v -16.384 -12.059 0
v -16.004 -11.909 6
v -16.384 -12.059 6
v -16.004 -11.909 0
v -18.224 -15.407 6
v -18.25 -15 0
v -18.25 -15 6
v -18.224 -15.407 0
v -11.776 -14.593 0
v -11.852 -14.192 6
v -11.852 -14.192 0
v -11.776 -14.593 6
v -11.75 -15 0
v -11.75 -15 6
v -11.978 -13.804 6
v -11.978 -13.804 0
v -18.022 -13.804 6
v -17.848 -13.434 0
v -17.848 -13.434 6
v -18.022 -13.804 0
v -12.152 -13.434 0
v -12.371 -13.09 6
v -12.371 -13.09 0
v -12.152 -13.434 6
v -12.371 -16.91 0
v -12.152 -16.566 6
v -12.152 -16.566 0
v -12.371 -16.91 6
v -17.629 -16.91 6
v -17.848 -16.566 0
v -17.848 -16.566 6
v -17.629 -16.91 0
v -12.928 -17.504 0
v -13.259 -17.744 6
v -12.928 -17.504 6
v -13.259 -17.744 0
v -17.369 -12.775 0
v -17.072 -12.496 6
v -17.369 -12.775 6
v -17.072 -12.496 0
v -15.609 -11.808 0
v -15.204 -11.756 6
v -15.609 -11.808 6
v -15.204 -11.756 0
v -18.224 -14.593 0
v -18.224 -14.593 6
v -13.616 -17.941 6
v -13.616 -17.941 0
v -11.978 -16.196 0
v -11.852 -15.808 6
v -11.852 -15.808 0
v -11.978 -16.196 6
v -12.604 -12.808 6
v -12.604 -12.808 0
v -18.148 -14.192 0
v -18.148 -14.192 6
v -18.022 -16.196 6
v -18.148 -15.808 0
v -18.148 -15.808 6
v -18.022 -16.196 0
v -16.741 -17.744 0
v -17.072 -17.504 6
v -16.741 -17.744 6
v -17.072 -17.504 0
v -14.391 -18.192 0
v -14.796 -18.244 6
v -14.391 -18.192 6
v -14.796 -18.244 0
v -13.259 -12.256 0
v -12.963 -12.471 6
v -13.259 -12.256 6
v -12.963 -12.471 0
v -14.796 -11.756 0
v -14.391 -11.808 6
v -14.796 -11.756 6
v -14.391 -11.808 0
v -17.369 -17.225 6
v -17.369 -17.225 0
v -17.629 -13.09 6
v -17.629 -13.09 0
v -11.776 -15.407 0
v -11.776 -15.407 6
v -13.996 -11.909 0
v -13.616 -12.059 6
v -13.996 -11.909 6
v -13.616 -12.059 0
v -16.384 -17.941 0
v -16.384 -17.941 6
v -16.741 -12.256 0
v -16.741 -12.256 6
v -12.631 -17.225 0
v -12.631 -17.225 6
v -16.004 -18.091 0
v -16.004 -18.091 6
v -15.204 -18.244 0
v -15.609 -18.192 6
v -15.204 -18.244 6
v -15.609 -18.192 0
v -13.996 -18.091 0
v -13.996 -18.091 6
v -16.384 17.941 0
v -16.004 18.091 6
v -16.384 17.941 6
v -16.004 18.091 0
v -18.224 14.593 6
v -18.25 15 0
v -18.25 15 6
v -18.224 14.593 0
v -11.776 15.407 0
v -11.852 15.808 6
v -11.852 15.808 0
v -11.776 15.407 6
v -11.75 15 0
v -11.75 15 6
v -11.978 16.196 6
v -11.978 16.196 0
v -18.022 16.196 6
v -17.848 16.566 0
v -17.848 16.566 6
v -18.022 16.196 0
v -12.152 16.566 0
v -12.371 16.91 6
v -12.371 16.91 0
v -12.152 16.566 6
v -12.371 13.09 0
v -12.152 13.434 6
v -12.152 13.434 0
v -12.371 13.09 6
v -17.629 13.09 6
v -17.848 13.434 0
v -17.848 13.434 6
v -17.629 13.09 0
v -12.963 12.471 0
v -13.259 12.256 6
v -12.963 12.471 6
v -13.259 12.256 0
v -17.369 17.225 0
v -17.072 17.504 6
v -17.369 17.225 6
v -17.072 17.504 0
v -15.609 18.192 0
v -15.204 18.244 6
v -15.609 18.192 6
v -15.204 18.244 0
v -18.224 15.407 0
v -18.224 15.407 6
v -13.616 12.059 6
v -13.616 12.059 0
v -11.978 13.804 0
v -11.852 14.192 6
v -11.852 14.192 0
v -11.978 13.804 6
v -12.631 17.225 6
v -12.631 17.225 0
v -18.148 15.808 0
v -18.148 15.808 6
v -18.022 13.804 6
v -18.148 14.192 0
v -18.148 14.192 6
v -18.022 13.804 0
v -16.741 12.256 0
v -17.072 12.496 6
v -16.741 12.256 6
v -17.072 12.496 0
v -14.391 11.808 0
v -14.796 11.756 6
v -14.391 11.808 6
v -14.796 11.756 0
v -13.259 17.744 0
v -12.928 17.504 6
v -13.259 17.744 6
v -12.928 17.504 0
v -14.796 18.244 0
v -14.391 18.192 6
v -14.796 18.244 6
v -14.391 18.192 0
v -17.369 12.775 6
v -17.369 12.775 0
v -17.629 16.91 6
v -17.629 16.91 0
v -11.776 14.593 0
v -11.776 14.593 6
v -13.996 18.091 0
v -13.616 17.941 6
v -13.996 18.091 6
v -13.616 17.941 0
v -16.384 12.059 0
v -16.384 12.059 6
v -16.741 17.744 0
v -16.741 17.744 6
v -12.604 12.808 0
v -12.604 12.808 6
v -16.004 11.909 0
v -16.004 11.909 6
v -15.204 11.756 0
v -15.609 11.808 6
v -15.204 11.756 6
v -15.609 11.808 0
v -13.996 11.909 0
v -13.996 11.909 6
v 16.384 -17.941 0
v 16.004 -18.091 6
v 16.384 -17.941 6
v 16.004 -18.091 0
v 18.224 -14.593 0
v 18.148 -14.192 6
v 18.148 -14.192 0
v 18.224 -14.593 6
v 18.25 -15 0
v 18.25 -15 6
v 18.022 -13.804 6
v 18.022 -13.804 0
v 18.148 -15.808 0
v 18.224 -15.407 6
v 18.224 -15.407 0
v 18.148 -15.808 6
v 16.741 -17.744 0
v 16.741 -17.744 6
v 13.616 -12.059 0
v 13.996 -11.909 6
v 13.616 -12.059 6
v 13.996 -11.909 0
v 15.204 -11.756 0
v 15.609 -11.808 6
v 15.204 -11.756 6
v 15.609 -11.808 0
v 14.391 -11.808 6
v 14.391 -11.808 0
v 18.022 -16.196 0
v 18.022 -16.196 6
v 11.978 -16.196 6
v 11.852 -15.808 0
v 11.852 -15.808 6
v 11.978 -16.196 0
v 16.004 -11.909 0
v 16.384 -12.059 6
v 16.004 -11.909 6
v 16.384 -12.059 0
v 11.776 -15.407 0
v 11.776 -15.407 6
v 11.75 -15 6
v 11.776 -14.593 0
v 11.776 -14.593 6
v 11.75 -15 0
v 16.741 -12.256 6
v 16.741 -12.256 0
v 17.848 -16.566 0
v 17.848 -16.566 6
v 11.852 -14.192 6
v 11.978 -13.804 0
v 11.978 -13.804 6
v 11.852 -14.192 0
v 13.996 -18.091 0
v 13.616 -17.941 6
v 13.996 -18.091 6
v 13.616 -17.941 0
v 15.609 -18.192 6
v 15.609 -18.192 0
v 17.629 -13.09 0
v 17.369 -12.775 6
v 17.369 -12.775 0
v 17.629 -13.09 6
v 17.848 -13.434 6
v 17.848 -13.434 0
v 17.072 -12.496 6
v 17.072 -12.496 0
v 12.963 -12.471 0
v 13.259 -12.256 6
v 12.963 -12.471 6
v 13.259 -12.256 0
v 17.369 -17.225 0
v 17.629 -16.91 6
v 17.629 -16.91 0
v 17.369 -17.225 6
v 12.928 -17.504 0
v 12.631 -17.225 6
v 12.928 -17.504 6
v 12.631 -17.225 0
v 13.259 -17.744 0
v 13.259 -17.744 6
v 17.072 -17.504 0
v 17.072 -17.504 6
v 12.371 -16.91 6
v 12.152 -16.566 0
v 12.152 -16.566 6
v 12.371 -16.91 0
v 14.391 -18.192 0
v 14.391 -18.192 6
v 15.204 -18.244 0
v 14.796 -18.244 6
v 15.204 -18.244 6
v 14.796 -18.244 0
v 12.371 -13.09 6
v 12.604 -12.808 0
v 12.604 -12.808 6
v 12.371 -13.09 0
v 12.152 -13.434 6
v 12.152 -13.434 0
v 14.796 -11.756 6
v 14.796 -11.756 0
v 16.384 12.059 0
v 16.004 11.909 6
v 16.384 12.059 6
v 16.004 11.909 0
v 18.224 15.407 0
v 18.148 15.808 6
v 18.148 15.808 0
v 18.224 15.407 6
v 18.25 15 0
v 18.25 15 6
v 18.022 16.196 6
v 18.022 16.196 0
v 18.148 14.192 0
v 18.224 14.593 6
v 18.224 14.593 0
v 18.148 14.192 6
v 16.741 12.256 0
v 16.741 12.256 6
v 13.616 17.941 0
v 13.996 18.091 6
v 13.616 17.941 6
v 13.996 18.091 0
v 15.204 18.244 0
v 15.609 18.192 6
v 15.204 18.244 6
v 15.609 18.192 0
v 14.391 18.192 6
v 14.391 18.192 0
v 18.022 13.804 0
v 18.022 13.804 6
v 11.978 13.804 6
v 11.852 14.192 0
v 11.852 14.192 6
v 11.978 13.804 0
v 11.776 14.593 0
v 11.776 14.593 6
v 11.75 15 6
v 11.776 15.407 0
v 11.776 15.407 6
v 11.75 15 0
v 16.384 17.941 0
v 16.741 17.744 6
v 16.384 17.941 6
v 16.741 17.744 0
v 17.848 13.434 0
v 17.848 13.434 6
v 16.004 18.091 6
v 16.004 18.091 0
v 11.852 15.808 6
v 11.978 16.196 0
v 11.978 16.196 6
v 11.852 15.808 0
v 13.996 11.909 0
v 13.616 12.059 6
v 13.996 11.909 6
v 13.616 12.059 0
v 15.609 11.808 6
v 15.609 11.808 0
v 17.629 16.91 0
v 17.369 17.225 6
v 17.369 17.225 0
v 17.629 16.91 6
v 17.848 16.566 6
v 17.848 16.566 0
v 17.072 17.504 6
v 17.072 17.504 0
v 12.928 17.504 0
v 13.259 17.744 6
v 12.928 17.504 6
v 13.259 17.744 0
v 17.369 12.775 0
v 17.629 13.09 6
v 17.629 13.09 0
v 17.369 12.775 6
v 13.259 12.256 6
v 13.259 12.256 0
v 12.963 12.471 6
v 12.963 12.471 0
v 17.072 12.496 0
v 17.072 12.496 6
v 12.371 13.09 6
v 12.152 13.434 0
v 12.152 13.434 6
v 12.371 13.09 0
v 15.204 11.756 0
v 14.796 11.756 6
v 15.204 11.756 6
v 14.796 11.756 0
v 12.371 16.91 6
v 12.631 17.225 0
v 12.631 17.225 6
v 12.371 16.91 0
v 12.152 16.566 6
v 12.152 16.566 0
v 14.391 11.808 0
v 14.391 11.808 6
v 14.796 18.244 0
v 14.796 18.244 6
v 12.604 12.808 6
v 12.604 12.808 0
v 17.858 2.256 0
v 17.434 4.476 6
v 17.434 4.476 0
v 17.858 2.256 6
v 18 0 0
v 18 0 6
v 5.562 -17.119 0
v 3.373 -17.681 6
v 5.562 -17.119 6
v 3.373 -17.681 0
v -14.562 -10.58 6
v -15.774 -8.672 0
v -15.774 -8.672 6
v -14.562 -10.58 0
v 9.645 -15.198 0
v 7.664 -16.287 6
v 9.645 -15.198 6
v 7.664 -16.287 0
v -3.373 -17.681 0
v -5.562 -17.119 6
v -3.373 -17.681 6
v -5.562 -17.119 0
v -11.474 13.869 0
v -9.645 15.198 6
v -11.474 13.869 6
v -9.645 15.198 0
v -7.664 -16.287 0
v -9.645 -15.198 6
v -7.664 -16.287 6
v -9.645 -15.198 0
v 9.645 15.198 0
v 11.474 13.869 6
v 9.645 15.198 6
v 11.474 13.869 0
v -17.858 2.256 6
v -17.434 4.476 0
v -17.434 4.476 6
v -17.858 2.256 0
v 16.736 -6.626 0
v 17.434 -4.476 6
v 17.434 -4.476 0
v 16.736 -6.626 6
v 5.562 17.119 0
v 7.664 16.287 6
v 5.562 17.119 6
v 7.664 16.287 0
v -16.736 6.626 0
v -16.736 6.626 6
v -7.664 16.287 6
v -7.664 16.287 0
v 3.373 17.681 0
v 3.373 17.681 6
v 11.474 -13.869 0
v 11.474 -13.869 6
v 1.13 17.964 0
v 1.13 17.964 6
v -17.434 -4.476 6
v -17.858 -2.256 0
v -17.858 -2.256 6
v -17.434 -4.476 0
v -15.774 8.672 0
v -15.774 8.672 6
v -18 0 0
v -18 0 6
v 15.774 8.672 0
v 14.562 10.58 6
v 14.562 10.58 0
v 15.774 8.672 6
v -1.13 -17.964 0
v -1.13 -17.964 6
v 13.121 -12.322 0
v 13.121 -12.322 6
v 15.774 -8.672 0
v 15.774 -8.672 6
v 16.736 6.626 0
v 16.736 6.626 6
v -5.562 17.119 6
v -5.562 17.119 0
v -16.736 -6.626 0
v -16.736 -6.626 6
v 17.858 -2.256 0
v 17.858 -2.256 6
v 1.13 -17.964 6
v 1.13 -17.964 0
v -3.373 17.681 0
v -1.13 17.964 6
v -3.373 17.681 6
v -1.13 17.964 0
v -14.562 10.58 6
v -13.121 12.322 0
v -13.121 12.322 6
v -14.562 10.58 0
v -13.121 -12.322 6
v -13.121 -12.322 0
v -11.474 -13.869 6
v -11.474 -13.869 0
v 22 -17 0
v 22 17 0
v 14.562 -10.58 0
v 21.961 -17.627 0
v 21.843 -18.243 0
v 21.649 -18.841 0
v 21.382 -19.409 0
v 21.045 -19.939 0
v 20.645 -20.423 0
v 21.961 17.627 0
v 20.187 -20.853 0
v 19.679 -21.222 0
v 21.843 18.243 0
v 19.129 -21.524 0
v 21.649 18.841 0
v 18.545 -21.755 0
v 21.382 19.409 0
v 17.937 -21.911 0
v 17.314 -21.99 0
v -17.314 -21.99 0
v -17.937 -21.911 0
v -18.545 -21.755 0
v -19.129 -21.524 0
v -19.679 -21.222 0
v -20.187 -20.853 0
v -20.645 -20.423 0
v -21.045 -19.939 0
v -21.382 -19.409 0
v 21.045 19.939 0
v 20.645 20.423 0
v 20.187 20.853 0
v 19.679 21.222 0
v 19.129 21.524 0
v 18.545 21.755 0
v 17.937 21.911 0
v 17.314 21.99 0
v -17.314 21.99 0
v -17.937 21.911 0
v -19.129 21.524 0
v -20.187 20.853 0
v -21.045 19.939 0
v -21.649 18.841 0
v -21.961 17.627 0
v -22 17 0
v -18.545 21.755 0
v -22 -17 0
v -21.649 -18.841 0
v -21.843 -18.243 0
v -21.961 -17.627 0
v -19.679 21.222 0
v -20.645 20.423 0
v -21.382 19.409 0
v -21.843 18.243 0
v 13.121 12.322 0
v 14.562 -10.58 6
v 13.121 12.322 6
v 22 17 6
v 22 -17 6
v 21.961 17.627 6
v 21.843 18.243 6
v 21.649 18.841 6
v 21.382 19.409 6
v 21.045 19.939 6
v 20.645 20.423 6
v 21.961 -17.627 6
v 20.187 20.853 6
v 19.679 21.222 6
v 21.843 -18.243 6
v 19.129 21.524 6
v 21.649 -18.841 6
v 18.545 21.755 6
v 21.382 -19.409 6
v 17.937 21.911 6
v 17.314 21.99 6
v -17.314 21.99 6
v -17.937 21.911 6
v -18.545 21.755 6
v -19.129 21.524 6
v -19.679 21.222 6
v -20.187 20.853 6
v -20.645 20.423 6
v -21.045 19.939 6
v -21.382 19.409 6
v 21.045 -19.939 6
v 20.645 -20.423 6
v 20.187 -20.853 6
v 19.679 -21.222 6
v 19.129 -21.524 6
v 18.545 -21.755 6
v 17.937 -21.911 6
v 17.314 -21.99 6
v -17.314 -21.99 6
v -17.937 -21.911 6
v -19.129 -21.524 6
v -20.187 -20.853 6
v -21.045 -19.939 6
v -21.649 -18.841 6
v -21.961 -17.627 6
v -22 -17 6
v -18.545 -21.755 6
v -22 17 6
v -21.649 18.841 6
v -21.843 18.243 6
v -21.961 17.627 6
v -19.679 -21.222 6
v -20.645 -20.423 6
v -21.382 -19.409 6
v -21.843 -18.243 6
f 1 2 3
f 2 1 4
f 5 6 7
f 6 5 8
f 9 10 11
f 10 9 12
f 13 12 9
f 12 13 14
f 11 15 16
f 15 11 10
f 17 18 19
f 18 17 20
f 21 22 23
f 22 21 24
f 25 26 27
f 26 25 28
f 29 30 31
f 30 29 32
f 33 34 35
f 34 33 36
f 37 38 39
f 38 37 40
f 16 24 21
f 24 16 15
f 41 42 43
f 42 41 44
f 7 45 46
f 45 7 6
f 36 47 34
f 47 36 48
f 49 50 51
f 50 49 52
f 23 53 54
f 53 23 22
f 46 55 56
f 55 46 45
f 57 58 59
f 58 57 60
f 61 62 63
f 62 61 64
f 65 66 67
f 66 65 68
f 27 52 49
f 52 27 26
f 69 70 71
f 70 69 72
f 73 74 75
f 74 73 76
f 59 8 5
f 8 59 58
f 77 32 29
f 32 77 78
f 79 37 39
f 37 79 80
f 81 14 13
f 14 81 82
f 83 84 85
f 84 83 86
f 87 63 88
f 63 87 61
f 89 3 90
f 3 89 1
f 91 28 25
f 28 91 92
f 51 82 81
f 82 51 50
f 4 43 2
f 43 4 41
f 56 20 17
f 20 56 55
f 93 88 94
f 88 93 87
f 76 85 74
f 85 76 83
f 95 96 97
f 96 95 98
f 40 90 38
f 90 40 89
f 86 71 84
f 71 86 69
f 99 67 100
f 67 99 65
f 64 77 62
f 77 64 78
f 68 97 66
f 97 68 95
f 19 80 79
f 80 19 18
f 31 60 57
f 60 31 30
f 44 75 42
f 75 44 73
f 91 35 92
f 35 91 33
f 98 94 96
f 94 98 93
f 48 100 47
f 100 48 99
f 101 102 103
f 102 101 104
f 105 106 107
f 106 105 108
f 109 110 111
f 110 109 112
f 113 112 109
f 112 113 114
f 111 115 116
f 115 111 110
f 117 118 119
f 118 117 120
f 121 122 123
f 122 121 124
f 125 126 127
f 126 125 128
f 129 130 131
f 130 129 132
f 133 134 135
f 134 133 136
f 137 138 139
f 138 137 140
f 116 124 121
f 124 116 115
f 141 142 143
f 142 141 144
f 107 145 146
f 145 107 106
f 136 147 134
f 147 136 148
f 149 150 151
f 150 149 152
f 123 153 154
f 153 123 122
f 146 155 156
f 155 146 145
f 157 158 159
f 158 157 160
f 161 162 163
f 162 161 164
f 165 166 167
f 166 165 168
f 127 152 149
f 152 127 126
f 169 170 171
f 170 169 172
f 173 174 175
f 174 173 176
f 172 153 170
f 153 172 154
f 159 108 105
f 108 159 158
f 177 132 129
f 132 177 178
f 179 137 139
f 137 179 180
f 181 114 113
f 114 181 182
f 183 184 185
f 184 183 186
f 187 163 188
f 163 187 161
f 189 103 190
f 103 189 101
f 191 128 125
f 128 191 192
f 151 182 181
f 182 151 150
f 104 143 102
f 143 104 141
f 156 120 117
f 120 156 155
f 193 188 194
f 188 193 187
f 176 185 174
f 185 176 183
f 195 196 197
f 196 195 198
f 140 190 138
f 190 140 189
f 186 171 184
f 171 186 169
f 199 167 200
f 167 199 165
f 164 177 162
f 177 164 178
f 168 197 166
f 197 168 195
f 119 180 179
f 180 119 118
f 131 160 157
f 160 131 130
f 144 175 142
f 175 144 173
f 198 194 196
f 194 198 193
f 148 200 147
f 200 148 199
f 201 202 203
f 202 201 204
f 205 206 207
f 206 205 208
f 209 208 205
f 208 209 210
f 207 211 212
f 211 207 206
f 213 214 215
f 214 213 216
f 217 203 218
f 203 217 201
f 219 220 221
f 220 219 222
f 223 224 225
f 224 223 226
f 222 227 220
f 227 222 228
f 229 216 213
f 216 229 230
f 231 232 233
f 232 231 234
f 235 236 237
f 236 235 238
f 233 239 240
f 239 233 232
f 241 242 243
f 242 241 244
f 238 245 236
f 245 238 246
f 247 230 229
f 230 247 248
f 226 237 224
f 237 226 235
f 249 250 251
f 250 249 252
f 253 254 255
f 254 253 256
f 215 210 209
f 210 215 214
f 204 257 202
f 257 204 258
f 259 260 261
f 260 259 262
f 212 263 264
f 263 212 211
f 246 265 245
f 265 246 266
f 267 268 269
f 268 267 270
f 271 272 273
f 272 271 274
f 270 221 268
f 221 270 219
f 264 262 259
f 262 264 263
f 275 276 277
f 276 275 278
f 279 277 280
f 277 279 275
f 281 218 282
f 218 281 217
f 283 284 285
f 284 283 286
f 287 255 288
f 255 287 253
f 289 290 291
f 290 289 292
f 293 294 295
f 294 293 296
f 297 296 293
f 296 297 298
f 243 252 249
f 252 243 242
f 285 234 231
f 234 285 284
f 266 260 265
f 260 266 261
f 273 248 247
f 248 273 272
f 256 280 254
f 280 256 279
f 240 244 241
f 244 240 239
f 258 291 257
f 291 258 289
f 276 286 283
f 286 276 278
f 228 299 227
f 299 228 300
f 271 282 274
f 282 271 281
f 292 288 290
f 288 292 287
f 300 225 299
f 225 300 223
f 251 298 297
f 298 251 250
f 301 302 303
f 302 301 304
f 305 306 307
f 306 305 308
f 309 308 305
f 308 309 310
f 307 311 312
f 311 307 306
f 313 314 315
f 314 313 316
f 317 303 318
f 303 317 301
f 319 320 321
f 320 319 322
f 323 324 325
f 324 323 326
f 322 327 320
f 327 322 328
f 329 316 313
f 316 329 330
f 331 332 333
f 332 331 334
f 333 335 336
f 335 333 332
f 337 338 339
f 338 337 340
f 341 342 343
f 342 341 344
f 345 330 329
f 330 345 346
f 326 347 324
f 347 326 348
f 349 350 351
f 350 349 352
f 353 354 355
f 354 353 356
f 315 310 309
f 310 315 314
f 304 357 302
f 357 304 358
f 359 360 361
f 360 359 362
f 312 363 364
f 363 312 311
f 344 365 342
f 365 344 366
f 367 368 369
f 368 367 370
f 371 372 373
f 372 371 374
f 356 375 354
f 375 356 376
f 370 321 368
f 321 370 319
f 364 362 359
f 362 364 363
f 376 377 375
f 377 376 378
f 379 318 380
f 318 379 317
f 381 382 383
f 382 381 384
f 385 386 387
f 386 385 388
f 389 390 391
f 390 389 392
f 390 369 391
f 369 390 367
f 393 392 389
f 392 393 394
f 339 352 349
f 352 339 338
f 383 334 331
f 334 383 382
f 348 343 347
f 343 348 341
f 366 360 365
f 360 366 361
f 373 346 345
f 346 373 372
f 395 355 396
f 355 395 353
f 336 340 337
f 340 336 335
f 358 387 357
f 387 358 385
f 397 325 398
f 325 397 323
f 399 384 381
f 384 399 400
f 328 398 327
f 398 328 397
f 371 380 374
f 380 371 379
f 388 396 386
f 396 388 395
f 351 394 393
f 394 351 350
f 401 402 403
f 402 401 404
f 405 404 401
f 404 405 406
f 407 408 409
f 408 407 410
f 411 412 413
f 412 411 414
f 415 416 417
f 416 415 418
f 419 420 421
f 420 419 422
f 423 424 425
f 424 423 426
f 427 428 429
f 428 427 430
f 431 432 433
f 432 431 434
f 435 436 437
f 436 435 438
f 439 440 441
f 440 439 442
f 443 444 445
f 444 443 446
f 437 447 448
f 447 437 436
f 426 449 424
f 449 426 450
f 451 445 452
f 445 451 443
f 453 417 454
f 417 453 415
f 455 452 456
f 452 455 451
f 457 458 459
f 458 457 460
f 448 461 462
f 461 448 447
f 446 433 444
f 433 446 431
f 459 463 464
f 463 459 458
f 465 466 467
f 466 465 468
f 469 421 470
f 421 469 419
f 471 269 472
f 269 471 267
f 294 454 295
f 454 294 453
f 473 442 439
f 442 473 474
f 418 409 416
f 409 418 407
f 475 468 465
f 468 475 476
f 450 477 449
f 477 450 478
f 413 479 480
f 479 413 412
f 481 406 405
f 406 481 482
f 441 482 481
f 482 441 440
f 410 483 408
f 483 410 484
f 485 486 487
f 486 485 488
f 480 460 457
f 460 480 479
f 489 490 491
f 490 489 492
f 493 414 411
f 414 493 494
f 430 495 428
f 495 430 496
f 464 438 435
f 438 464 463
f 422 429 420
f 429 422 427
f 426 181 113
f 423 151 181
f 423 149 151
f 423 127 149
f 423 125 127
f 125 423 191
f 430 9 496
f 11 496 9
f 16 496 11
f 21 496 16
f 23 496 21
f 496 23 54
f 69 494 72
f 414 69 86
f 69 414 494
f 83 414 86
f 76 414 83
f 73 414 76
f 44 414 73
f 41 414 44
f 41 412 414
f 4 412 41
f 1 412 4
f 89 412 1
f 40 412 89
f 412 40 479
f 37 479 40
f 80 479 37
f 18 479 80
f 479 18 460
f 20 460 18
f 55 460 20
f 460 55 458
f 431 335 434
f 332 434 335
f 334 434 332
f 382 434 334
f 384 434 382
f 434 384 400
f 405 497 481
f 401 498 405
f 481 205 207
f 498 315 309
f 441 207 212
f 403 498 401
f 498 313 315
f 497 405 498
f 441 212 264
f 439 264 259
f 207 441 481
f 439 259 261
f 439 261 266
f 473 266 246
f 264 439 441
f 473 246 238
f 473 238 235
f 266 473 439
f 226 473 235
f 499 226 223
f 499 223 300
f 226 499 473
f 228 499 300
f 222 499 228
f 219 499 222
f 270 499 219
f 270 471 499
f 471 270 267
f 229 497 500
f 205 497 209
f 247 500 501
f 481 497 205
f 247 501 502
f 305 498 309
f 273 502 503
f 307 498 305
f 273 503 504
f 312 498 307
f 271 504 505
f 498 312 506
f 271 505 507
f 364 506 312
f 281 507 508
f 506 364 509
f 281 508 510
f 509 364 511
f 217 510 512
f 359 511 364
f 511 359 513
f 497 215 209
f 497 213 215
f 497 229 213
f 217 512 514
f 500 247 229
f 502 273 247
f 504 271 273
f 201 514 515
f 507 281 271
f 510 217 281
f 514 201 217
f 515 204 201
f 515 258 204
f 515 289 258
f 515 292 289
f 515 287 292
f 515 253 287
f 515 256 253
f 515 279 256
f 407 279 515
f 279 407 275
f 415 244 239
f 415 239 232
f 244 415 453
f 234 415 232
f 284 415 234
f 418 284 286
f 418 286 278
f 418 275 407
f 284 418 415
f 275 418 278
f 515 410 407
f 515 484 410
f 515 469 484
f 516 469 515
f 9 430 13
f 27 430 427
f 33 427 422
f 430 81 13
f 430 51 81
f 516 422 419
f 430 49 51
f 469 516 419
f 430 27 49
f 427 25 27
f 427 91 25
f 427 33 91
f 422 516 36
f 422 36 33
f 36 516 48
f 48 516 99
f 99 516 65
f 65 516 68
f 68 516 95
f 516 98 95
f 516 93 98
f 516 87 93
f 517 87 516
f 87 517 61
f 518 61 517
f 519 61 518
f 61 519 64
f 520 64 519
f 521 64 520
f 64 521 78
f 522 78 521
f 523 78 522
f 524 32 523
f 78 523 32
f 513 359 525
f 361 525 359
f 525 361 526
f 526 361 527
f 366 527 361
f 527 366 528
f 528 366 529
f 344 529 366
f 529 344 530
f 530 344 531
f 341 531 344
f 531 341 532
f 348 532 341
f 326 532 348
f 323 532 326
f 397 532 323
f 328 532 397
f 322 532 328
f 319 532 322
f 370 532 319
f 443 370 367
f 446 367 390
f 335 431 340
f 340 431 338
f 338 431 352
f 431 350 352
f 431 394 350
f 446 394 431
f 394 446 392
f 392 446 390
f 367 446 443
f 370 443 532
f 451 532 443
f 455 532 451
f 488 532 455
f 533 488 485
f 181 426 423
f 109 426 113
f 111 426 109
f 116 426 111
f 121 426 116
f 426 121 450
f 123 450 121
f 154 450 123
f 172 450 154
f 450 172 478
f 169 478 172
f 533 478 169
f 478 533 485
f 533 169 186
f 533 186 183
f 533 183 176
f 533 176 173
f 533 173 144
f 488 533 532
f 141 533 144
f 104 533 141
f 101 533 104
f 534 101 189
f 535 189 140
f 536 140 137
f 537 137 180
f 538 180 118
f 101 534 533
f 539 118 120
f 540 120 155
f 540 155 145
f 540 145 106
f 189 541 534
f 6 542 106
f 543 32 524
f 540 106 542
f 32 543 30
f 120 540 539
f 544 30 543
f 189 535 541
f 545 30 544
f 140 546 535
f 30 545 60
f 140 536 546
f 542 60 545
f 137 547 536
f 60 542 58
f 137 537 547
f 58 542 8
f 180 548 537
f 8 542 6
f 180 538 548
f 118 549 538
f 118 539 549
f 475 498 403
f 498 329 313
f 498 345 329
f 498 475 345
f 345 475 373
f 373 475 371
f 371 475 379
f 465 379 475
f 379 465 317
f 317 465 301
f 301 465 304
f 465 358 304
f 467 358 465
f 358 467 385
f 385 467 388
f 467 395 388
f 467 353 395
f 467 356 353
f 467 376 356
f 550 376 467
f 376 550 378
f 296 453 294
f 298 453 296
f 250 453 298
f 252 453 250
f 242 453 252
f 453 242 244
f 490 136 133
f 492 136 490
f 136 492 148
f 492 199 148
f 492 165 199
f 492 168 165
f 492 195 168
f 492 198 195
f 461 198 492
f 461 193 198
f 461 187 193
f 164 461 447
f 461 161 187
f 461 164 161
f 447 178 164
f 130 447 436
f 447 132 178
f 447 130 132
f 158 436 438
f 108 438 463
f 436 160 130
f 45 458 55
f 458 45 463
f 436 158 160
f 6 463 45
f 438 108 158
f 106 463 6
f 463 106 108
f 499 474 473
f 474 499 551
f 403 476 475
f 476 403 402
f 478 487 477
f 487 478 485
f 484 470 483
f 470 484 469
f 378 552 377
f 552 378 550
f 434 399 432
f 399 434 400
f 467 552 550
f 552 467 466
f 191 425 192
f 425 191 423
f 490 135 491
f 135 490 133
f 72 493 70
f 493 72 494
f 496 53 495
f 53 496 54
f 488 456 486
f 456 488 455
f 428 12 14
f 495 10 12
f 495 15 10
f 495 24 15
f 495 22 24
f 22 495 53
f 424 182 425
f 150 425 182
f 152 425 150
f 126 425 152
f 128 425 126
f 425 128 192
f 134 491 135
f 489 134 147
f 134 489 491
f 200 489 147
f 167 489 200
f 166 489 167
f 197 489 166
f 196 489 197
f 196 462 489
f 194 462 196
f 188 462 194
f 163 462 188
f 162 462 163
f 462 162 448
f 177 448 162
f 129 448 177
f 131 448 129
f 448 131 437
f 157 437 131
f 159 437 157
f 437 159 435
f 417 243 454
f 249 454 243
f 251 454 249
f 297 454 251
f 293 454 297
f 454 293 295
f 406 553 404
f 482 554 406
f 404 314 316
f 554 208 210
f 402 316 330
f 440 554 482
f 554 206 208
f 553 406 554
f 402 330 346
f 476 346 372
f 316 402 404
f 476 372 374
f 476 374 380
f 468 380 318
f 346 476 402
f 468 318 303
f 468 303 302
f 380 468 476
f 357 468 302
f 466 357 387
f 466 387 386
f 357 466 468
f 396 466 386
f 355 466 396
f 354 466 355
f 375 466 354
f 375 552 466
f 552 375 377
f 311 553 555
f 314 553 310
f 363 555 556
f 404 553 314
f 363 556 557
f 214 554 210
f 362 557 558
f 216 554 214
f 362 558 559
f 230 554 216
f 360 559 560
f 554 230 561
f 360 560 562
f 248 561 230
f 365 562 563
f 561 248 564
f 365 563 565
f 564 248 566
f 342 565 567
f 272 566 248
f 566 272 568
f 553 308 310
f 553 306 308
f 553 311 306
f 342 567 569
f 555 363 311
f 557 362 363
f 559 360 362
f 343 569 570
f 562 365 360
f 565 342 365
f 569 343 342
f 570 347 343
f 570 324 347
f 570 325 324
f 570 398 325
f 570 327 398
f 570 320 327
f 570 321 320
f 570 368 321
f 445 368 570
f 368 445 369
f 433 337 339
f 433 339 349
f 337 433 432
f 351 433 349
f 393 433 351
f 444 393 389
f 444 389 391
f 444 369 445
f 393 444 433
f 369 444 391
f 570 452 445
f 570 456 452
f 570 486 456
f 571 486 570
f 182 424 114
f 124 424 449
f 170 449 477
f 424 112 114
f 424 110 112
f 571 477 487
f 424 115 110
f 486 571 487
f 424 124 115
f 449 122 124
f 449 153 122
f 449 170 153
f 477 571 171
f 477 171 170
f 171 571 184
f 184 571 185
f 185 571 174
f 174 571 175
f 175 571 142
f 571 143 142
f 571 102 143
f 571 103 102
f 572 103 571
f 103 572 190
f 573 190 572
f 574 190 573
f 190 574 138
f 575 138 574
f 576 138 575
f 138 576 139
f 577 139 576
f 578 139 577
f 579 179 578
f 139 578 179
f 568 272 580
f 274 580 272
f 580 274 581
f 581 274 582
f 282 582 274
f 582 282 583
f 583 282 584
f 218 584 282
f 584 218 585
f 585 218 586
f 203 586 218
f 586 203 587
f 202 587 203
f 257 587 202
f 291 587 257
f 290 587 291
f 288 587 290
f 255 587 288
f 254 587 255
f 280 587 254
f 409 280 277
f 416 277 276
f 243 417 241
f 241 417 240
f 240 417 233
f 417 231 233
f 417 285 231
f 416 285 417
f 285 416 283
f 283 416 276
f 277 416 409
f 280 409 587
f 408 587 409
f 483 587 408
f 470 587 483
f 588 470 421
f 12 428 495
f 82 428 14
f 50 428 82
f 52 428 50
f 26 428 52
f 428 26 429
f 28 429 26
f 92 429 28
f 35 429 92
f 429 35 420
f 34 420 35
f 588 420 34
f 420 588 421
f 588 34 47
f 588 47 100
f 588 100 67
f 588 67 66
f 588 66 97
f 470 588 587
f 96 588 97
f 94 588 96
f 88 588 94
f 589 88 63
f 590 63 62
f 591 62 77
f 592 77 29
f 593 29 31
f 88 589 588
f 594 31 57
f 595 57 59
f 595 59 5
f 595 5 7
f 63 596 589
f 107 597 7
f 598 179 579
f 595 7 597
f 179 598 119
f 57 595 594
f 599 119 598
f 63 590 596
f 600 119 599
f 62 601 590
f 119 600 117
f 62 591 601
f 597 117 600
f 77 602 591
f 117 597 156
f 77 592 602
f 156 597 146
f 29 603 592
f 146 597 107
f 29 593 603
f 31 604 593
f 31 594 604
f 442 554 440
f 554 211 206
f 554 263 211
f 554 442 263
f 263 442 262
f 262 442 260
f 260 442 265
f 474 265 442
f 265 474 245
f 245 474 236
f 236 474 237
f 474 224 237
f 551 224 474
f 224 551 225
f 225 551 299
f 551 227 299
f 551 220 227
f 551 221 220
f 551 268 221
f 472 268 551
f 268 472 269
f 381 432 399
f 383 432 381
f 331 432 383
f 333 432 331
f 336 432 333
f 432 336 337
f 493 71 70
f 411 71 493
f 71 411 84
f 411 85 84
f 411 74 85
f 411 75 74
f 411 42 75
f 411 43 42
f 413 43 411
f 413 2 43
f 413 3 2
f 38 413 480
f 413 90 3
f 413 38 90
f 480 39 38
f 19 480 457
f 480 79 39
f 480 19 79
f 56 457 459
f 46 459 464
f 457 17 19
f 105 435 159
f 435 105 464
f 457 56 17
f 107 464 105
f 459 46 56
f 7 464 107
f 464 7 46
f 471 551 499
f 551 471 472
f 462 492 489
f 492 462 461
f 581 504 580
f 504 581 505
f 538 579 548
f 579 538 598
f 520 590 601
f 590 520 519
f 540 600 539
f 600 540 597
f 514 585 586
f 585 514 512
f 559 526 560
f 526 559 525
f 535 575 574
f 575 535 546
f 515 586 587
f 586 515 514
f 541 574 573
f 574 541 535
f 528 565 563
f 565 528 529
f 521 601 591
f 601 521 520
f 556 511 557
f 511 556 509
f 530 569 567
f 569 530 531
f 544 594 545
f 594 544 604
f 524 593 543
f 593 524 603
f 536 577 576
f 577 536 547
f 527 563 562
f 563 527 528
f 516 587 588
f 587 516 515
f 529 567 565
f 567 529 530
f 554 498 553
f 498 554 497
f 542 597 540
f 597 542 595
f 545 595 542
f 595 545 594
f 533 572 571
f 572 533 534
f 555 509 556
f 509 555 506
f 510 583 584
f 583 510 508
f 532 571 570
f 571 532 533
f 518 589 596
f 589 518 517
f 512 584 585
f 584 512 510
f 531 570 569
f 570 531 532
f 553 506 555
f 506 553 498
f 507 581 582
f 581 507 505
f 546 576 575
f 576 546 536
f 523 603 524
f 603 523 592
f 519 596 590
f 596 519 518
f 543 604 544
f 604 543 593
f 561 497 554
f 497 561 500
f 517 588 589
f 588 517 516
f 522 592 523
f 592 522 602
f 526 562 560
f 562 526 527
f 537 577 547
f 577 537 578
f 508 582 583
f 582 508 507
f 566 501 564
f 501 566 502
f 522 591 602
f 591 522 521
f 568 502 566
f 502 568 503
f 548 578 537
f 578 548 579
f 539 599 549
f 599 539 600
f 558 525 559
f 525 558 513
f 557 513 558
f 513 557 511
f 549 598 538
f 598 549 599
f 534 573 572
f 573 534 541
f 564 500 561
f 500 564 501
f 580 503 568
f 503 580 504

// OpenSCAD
$fn = 50;

difference() {
	union() {
		hull() {
			translate(v = [-17.0, 17.0, 0]) {
				cylinder(h = 6, r = 5);
			}
			translate(v = [17.0, 17.0, 0]) {
				cylinder(h = 6, r = 5);
			}
			translate(v = [-17.0, -17.0, 0]) {
				cylinder(h = 6, r = 5);
			}
			translate(v = [17.0, -17.0, 0]) {
				cylinder(h = 6, r = 5);
			}
		}
	}
	union() {
		translate(v = [-15.0, -15.0, -100.0]) {
			cylinder(h = 200, r = 3.25);
		}
		translate(v = [-15.0, 15.0, -100.0]) {
			cylinder(h = 200, r = 3.25);
		}
		translate(v = [15.0, -15.0, -100.0]) {
			cylinder(h = 200, r = 3.25);
		}
		translate(v = [15.0, 15.0, -100.0]) {
			cylinder(h = 200, r = 3.25);
		}
		translate(v = [-15.0, -15.0, -100.0]) {
			cylinder(h = 200, r = 1.8);
		}
		translate(v = [-15.0, 15.0, -100.0]) {
			cylinder(h = 200, r = 1.8);
		}
		translate(v = [15.0, -15.0, -100.0]) {
			cylinder(h = 200, r = 1.8);
		}
		translate(v = [15.0, 15.0, -100.0]) {
			cylinder(h = 200, r = 1.8);
		}
		cylinder(h = 6, r = 18.0);
	}
}
